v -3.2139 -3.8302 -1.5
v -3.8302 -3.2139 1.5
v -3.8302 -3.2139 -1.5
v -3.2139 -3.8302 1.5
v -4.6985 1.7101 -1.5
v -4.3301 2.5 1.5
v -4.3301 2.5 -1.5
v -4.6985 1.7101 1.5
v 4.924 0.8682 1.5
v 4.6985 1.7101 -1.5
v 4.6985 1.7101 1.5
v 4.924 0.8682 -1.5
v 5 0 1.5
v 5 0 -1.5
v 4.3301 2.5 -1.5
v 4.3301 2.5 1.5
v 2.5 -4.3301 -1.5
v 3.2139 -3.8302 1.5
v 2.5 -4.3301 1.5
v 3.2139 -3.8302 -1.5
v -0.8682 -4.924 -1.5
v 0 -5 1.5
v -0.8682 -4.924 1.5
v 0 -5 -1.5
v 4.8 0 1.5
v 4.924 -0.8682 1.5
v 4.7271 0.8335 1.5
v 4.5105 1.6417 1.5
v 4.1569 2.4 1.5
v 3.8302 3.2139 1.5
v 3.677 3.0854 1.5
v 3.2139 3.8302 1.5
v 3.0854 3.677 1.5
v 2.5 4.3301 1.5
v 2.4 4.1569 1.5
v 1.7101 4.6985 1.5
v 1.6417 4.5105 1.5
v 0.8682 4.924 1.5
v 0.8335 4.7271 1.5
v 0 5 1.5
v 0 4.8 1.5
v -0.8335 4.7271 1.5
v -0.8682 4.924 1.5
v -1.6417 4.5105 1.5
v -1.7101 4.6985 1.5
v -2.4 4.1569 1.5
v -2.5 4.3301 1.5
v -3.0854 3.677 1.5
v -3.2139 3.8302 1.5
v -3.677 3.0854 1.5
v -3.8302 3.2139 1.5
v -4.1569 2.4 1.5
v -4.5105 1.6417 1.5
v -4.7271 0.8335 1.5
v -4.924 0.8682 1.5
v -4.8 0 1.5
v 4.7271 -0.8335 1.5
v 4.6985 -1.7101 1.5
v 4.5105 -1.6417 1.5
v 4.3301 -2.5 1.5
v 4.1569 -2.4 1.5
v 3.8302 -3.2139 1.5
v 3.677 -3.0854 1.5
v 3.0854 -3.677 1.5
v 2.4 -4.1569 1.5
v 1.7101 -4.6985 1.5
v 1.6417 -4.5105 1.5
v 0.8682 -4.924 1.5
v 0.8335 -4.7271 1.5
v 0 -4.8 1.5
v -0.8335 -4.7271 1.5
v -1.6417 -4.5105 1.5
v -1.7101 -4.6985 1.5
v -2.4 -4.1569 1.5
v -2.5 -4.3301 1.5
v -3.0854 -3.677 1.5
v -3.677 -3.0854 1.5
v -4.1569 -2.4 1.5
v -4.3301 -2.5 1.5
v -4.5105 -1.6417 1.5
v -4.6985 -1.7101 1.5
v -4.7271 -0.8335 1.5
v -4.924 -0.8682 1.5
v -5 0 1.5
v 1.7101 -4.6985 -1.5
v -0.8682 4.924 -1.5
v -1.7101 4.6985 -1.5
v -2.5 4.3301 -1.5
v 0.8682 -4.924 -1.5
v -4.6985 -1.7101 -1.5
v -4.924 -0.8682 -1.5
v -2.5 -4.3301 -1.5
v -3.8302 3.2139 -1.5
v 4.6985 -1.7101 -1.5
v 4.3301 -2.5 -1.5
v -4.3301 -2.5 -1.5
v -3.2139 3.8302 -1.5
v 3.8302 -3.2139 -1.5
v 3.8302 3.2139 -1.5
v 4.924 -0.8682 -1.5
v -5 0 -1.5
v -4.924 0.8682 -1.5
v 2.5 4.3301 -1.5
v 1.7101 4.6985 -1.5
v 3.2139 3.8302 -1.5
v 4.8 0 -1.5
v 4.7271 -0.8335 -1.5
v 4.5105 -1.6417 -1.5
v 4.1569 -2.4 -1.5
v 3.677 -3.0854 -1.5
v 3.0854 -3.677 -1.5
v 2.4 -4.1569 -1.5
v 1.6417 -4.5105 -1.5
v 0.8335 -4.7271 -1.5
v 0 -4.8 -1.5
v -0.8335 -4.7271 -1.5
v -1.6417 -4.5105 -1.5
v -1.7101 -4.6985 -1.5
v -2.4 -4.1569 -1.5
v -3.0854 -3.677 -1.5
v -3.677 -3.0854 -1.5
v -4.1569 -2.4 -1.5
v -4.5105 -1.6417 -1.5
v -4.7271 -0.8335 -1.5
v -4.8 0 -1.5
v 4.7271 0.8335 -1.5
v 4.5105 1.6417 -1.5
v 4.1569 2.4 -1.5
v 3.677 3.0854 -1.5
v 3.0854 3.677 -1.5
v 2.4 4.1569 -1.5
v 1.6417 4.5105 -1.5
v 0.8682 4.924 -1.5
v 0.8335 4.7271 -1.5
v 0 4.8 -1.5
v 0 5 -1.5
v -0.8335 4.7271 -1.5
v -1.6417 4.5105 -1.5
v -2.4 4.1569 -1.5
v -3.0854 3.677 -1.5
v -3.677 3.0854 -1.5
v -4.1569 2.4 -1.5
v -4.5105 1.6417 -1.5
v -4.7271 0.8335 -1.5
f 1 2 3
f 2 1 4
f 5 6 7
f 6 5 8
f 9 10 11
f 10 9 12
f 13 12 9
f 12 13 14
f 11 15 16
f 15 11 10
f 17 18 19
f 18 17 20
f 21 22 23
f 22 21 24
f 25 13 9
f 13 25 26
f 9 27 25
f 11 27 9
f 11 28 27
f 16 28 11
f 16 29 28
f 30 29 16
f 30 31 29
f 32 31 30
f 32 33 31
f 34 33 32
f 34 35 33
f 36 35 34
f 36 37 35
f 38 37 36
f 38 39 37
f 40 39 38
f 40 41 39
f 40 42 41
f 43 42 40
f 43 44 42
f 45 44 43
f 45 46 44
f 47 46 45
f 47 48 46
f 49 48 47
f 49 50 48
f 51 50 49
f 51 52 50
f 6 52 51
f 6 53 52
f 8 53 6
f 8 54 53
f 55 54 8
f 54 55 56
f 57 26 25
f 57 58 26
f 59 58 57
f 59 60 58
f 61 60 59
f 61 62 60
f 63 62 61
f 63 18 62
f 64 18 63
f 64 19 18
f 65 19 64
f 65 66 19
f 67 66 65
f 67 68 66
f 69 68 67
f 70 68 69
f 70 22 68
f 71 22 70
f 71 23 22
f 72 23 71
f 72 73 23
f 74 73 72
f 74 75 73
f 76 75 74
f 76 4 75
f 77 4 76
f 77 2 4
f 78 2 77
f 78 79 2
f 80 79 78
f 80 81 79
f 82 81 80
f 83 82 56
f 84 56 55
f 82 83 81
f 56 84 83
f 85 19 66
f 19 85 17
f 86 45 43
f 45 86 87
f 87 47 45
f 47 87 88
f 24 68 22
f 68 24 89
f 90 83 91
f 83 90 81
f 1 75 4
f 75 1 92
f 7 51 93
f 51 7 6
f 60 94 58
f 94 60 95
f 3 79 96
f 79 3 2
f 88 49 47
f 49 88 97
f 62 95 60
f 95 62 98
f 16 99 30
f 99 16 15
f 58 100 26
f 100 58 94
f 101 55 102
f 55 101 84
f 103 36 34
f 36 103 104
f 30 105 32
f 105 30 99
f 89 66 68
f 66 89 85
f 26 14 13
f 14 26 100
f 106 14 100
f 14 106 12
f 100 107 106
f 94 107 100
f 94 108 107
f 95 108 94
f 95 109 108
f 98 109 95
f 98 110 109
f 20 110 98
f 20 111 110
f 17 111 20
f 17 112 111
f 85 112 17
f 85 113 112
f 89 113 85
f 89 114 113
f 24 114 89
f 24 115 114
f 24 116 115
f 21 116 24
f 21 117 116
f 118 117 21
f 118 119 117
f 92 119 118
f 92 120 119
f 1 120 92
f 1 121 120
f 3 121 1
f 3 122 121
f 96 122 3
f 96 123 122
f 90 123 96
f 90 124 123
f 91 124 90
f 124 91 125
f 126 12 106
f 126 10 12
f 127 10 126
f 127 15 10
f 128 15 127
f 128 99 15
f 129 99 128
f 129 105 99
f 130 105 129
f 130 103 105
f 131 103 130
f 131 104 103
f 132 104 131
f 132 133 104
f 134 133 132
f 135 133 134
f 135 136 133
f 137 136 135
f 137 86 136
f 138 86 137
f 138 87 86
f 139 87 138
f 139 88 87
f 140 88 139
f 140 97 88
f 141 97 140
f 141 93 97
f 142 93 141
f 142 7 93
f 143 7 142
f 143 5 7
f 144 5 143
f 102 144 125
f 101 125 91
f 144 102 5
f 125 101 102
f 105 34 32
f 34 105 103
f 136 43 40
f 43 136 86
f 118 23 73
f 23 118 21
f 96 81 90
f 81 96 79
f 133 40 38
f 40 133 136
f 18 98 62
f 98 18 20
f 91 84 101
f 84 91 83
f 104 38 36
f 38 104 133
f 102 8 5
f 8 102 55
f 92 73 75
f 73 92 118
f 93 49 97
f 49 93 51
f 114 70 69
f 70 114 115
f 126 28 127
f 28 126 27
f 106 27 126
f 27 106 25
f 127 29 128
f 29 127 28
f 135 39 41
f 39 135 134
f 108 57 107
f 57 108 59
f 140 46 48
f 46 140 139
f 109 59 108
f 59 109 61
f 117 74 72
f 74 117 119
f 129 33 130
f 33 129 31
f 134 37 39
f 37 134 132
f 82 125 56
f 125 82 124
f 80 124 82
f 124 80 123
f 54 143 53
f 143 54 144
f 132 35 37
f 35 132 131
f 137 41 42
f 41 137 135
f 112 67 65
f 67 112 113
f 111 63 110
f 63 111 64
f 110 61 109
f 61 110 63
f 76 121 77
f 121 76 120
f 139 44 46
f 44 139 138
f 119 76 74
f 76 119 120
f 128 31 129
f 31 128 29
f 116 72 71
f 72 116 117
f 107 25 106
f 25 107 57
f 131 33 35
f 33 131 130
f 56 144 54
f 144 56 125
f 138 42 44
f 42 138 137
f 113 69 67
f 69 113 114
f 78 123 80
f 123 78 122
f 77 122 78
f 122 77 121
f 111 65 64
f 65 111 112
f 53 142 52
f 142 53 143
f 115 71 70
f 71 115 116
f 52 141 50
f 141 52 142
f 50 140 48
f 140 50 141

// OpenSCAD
// ring module
// @author Ilya Protasov

height = 3;
outerR = 5;
innerR = 4.8;

$fn = 36;

module ring(height, outerR, innerR) {
    difference() {
        cylinder(height, outerR, outerR, true);
        cylinder(height * 2, innerR, innerR, true);
    }
}

ring(height = height, outerR = outerR, innerR = innerR);
